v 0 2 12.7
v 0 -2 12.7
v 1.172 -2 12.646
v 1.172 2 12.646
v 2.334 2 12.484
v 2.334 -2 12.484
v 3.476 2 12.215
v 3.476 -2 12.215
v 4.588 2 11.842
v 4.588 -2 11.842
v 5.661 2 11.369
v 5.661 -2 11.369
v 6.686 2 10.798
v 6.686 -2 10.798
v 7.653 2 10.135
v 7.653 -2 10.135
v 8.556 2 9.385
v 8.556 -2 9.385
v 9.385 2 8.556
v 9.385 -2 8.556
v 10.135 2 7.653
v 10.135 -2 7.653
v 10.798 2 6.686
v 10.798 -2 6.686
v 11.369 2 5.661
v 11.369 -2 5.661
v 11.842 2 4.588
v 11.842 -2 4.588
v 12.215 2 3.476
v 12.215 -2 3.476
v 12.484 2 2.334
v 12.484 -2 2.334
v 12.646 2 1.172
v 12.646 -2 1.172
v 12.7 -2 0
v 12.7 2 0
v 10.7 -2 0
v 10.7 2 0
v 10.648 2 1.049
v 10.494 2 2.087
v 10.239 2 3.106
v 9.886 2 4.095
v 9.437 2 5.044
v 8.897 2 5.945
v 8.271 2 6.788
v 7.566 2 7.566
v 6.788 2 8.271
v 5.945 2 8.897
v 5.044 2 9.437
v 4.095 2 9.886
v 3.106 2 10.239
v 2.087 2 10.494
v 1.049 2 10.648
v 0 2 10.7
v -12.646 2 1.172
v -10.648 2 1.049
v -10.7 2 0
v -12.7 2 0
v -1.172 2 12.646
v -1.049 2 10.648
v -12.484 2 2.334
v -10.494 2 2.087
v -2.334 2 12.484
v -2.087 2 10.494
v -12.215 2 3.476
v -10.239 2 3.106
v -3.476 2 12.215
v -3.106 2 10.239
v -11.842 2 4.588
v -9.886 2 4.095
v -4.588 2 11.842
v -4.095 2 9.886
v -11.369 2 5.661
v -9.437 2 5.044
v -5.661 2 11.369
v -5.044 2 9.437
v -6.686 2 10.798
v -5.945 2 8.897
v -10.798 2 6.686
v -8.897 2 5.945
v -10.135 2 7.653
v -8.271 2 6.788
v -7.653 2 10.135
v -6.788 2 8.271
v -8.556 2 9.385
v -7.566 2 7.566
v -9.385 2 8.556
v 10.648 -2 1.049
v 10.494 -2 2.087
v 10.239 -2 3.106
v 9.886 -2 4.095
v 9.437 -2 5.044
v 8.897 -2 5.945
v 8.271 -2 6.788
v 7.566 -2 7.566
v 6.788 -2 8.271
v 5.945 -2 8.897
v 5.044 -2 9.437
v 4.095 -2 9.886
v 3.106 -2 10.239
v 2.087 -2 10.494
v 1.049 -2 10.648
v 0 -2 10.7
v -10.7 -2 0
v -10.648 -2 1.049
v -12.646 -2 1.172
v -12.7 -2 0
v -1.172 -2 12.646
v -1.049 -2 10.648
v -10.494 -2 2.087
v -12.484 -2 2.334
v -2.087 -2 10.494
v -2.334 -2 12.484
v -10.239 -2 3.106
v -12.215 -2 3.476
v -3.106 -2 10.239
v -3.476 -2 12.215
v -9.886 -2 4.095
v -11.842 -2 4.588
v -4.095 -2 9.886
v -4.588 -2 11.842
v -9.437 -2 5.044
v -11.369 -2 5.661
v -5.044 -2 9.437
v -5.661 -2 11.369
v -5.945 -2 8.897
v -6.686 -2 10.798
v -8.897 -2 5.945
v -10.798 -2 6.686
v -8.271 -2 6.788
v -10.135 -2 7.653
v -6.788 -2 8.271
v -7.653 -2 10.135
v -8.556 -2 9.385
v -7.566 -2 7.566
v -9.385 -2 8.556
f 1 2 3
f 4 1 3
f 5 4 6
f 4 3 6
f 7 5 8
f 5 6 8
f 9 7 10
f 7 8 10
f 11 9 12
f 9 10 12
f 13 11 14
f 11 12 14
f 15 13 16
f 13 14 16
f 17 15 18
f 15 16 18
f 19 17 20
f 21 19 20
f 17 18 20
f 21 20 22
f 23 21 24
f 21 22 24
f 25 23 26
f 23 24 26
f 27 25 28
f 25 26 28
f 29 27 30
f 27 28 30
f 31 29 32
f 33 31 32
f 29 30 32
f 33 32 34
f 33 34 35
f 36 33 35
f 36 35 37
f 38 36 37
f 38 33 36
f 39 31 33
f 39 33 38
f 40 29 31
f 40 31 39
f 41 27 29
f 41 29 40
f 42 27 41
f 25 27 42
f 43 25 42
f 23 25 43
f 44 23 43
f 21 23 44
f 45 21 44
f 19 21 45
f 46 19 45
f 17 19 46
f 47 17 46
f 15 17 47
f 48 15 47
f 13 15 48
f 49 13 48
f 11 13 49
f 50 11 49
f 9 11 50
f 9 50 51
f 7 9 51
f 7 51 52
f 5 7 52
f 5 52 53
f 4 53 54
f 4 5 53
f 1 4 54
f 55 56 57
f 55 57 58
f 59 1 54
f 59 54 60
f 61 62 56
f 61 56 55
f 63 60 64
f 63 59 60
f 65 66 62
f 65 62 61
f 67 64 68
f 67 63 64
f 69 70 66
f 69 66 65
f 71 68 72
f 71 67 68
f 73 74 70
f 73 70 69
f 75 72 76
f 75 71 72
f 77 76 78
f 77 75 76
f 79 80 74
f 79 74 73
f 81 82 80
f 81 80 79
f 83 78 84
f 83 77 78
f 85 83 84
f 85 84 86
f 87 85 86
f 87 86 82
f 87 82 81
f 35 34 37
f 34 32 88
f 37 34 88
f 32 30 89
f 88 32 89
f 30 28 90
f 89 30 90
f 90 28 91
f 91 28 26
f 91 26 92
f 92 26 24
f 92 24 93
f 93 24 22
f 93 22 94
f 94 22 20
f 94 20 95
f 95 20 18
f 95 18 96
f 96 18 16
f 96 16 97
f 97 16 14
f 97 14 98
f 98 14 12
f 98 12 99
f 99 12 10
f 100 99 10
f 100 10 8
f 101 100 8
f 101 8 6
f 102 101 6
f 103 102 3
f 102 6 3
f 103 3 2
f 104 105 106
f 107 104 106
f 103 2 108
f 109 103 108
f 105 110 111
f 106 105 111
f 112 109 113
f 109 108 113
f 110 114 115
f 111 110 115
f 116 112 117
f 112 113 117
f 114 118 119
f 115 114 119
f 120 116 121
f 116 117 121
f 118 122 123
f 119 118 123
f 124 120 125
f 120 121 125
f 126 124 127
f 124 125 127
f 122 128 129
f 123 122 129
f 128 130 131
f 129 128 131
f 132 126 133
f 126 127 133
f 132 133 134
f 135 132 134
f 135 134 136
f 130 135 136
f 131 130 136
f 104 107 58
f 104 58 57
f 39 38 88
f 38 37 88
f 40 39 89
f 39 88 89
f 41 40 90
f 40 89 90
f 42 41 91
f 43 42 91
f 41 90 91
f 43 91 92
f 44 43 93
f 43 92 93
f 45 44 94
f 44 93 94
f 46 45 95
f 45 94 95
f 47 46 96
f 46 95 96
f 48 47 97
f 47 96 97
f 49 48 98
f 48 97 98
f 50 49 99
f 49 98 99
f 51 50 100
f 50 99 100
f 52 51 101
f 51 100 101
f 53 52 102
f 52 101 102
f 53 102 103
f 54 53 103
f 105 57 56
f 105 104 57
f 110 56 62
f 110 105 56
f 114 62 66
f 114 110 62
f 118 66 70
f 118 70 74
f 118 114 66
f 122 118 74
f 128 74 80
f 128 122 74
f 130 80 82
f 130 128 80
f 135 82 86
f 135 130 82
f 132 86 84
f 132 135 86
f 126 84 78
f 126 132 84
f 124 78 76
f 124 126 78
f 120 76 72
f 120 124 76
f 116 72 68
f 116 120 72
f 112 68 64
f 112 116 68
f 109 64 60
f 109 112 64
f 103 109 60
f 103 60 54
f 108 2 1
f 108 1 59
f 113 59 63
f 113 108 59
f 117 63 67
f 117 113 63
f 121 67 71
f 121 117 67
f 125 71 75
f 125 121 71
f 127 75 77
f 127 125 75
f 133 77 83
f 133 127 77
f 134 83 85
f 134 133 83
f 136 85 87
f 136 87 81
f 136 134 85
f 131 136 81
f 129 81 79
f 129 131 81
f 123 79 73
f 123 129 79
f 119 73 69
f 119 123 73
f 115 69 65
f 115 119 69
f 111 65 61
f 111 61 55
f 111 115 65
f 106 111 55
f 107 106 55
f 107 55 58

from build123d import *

# Parameters (mm, degrees)
F1_DEPTH      = 2
F1_DEPTH_BACK = 2


with BuildPart() as f1:
    # F0 (on Front) → F1 (new body, two sides)
    with BuildSketch(Plane.XZ) as f1_sk:
        with BuildLine():
            Line((0, 10.7), (0, 12.7))
            ThreePointArc((0, 12.7), (-8.980256, 8.980256), (-12.7, 0))
            Line((-12.7, 0), (-10.7, 0))
            ThreePointArc((-10.7, 0), (-7.566043, 7.566043), (0, 10.7))
        make_face()
    extrude(amount=F1_DEPTH)
    extrude(f1_sk.sketch, amount=-F1_DEPTH_BACK)

    # F2: F1 across face


with BuildPart() as f1_1:
    add(f1.part)
    add(f1.part.mirror(Plane(origin=(0, 0, 11.7), x_dir=(0, 1, 0), z_dir=(1, 0, 0))))


solid = f1_1.part
